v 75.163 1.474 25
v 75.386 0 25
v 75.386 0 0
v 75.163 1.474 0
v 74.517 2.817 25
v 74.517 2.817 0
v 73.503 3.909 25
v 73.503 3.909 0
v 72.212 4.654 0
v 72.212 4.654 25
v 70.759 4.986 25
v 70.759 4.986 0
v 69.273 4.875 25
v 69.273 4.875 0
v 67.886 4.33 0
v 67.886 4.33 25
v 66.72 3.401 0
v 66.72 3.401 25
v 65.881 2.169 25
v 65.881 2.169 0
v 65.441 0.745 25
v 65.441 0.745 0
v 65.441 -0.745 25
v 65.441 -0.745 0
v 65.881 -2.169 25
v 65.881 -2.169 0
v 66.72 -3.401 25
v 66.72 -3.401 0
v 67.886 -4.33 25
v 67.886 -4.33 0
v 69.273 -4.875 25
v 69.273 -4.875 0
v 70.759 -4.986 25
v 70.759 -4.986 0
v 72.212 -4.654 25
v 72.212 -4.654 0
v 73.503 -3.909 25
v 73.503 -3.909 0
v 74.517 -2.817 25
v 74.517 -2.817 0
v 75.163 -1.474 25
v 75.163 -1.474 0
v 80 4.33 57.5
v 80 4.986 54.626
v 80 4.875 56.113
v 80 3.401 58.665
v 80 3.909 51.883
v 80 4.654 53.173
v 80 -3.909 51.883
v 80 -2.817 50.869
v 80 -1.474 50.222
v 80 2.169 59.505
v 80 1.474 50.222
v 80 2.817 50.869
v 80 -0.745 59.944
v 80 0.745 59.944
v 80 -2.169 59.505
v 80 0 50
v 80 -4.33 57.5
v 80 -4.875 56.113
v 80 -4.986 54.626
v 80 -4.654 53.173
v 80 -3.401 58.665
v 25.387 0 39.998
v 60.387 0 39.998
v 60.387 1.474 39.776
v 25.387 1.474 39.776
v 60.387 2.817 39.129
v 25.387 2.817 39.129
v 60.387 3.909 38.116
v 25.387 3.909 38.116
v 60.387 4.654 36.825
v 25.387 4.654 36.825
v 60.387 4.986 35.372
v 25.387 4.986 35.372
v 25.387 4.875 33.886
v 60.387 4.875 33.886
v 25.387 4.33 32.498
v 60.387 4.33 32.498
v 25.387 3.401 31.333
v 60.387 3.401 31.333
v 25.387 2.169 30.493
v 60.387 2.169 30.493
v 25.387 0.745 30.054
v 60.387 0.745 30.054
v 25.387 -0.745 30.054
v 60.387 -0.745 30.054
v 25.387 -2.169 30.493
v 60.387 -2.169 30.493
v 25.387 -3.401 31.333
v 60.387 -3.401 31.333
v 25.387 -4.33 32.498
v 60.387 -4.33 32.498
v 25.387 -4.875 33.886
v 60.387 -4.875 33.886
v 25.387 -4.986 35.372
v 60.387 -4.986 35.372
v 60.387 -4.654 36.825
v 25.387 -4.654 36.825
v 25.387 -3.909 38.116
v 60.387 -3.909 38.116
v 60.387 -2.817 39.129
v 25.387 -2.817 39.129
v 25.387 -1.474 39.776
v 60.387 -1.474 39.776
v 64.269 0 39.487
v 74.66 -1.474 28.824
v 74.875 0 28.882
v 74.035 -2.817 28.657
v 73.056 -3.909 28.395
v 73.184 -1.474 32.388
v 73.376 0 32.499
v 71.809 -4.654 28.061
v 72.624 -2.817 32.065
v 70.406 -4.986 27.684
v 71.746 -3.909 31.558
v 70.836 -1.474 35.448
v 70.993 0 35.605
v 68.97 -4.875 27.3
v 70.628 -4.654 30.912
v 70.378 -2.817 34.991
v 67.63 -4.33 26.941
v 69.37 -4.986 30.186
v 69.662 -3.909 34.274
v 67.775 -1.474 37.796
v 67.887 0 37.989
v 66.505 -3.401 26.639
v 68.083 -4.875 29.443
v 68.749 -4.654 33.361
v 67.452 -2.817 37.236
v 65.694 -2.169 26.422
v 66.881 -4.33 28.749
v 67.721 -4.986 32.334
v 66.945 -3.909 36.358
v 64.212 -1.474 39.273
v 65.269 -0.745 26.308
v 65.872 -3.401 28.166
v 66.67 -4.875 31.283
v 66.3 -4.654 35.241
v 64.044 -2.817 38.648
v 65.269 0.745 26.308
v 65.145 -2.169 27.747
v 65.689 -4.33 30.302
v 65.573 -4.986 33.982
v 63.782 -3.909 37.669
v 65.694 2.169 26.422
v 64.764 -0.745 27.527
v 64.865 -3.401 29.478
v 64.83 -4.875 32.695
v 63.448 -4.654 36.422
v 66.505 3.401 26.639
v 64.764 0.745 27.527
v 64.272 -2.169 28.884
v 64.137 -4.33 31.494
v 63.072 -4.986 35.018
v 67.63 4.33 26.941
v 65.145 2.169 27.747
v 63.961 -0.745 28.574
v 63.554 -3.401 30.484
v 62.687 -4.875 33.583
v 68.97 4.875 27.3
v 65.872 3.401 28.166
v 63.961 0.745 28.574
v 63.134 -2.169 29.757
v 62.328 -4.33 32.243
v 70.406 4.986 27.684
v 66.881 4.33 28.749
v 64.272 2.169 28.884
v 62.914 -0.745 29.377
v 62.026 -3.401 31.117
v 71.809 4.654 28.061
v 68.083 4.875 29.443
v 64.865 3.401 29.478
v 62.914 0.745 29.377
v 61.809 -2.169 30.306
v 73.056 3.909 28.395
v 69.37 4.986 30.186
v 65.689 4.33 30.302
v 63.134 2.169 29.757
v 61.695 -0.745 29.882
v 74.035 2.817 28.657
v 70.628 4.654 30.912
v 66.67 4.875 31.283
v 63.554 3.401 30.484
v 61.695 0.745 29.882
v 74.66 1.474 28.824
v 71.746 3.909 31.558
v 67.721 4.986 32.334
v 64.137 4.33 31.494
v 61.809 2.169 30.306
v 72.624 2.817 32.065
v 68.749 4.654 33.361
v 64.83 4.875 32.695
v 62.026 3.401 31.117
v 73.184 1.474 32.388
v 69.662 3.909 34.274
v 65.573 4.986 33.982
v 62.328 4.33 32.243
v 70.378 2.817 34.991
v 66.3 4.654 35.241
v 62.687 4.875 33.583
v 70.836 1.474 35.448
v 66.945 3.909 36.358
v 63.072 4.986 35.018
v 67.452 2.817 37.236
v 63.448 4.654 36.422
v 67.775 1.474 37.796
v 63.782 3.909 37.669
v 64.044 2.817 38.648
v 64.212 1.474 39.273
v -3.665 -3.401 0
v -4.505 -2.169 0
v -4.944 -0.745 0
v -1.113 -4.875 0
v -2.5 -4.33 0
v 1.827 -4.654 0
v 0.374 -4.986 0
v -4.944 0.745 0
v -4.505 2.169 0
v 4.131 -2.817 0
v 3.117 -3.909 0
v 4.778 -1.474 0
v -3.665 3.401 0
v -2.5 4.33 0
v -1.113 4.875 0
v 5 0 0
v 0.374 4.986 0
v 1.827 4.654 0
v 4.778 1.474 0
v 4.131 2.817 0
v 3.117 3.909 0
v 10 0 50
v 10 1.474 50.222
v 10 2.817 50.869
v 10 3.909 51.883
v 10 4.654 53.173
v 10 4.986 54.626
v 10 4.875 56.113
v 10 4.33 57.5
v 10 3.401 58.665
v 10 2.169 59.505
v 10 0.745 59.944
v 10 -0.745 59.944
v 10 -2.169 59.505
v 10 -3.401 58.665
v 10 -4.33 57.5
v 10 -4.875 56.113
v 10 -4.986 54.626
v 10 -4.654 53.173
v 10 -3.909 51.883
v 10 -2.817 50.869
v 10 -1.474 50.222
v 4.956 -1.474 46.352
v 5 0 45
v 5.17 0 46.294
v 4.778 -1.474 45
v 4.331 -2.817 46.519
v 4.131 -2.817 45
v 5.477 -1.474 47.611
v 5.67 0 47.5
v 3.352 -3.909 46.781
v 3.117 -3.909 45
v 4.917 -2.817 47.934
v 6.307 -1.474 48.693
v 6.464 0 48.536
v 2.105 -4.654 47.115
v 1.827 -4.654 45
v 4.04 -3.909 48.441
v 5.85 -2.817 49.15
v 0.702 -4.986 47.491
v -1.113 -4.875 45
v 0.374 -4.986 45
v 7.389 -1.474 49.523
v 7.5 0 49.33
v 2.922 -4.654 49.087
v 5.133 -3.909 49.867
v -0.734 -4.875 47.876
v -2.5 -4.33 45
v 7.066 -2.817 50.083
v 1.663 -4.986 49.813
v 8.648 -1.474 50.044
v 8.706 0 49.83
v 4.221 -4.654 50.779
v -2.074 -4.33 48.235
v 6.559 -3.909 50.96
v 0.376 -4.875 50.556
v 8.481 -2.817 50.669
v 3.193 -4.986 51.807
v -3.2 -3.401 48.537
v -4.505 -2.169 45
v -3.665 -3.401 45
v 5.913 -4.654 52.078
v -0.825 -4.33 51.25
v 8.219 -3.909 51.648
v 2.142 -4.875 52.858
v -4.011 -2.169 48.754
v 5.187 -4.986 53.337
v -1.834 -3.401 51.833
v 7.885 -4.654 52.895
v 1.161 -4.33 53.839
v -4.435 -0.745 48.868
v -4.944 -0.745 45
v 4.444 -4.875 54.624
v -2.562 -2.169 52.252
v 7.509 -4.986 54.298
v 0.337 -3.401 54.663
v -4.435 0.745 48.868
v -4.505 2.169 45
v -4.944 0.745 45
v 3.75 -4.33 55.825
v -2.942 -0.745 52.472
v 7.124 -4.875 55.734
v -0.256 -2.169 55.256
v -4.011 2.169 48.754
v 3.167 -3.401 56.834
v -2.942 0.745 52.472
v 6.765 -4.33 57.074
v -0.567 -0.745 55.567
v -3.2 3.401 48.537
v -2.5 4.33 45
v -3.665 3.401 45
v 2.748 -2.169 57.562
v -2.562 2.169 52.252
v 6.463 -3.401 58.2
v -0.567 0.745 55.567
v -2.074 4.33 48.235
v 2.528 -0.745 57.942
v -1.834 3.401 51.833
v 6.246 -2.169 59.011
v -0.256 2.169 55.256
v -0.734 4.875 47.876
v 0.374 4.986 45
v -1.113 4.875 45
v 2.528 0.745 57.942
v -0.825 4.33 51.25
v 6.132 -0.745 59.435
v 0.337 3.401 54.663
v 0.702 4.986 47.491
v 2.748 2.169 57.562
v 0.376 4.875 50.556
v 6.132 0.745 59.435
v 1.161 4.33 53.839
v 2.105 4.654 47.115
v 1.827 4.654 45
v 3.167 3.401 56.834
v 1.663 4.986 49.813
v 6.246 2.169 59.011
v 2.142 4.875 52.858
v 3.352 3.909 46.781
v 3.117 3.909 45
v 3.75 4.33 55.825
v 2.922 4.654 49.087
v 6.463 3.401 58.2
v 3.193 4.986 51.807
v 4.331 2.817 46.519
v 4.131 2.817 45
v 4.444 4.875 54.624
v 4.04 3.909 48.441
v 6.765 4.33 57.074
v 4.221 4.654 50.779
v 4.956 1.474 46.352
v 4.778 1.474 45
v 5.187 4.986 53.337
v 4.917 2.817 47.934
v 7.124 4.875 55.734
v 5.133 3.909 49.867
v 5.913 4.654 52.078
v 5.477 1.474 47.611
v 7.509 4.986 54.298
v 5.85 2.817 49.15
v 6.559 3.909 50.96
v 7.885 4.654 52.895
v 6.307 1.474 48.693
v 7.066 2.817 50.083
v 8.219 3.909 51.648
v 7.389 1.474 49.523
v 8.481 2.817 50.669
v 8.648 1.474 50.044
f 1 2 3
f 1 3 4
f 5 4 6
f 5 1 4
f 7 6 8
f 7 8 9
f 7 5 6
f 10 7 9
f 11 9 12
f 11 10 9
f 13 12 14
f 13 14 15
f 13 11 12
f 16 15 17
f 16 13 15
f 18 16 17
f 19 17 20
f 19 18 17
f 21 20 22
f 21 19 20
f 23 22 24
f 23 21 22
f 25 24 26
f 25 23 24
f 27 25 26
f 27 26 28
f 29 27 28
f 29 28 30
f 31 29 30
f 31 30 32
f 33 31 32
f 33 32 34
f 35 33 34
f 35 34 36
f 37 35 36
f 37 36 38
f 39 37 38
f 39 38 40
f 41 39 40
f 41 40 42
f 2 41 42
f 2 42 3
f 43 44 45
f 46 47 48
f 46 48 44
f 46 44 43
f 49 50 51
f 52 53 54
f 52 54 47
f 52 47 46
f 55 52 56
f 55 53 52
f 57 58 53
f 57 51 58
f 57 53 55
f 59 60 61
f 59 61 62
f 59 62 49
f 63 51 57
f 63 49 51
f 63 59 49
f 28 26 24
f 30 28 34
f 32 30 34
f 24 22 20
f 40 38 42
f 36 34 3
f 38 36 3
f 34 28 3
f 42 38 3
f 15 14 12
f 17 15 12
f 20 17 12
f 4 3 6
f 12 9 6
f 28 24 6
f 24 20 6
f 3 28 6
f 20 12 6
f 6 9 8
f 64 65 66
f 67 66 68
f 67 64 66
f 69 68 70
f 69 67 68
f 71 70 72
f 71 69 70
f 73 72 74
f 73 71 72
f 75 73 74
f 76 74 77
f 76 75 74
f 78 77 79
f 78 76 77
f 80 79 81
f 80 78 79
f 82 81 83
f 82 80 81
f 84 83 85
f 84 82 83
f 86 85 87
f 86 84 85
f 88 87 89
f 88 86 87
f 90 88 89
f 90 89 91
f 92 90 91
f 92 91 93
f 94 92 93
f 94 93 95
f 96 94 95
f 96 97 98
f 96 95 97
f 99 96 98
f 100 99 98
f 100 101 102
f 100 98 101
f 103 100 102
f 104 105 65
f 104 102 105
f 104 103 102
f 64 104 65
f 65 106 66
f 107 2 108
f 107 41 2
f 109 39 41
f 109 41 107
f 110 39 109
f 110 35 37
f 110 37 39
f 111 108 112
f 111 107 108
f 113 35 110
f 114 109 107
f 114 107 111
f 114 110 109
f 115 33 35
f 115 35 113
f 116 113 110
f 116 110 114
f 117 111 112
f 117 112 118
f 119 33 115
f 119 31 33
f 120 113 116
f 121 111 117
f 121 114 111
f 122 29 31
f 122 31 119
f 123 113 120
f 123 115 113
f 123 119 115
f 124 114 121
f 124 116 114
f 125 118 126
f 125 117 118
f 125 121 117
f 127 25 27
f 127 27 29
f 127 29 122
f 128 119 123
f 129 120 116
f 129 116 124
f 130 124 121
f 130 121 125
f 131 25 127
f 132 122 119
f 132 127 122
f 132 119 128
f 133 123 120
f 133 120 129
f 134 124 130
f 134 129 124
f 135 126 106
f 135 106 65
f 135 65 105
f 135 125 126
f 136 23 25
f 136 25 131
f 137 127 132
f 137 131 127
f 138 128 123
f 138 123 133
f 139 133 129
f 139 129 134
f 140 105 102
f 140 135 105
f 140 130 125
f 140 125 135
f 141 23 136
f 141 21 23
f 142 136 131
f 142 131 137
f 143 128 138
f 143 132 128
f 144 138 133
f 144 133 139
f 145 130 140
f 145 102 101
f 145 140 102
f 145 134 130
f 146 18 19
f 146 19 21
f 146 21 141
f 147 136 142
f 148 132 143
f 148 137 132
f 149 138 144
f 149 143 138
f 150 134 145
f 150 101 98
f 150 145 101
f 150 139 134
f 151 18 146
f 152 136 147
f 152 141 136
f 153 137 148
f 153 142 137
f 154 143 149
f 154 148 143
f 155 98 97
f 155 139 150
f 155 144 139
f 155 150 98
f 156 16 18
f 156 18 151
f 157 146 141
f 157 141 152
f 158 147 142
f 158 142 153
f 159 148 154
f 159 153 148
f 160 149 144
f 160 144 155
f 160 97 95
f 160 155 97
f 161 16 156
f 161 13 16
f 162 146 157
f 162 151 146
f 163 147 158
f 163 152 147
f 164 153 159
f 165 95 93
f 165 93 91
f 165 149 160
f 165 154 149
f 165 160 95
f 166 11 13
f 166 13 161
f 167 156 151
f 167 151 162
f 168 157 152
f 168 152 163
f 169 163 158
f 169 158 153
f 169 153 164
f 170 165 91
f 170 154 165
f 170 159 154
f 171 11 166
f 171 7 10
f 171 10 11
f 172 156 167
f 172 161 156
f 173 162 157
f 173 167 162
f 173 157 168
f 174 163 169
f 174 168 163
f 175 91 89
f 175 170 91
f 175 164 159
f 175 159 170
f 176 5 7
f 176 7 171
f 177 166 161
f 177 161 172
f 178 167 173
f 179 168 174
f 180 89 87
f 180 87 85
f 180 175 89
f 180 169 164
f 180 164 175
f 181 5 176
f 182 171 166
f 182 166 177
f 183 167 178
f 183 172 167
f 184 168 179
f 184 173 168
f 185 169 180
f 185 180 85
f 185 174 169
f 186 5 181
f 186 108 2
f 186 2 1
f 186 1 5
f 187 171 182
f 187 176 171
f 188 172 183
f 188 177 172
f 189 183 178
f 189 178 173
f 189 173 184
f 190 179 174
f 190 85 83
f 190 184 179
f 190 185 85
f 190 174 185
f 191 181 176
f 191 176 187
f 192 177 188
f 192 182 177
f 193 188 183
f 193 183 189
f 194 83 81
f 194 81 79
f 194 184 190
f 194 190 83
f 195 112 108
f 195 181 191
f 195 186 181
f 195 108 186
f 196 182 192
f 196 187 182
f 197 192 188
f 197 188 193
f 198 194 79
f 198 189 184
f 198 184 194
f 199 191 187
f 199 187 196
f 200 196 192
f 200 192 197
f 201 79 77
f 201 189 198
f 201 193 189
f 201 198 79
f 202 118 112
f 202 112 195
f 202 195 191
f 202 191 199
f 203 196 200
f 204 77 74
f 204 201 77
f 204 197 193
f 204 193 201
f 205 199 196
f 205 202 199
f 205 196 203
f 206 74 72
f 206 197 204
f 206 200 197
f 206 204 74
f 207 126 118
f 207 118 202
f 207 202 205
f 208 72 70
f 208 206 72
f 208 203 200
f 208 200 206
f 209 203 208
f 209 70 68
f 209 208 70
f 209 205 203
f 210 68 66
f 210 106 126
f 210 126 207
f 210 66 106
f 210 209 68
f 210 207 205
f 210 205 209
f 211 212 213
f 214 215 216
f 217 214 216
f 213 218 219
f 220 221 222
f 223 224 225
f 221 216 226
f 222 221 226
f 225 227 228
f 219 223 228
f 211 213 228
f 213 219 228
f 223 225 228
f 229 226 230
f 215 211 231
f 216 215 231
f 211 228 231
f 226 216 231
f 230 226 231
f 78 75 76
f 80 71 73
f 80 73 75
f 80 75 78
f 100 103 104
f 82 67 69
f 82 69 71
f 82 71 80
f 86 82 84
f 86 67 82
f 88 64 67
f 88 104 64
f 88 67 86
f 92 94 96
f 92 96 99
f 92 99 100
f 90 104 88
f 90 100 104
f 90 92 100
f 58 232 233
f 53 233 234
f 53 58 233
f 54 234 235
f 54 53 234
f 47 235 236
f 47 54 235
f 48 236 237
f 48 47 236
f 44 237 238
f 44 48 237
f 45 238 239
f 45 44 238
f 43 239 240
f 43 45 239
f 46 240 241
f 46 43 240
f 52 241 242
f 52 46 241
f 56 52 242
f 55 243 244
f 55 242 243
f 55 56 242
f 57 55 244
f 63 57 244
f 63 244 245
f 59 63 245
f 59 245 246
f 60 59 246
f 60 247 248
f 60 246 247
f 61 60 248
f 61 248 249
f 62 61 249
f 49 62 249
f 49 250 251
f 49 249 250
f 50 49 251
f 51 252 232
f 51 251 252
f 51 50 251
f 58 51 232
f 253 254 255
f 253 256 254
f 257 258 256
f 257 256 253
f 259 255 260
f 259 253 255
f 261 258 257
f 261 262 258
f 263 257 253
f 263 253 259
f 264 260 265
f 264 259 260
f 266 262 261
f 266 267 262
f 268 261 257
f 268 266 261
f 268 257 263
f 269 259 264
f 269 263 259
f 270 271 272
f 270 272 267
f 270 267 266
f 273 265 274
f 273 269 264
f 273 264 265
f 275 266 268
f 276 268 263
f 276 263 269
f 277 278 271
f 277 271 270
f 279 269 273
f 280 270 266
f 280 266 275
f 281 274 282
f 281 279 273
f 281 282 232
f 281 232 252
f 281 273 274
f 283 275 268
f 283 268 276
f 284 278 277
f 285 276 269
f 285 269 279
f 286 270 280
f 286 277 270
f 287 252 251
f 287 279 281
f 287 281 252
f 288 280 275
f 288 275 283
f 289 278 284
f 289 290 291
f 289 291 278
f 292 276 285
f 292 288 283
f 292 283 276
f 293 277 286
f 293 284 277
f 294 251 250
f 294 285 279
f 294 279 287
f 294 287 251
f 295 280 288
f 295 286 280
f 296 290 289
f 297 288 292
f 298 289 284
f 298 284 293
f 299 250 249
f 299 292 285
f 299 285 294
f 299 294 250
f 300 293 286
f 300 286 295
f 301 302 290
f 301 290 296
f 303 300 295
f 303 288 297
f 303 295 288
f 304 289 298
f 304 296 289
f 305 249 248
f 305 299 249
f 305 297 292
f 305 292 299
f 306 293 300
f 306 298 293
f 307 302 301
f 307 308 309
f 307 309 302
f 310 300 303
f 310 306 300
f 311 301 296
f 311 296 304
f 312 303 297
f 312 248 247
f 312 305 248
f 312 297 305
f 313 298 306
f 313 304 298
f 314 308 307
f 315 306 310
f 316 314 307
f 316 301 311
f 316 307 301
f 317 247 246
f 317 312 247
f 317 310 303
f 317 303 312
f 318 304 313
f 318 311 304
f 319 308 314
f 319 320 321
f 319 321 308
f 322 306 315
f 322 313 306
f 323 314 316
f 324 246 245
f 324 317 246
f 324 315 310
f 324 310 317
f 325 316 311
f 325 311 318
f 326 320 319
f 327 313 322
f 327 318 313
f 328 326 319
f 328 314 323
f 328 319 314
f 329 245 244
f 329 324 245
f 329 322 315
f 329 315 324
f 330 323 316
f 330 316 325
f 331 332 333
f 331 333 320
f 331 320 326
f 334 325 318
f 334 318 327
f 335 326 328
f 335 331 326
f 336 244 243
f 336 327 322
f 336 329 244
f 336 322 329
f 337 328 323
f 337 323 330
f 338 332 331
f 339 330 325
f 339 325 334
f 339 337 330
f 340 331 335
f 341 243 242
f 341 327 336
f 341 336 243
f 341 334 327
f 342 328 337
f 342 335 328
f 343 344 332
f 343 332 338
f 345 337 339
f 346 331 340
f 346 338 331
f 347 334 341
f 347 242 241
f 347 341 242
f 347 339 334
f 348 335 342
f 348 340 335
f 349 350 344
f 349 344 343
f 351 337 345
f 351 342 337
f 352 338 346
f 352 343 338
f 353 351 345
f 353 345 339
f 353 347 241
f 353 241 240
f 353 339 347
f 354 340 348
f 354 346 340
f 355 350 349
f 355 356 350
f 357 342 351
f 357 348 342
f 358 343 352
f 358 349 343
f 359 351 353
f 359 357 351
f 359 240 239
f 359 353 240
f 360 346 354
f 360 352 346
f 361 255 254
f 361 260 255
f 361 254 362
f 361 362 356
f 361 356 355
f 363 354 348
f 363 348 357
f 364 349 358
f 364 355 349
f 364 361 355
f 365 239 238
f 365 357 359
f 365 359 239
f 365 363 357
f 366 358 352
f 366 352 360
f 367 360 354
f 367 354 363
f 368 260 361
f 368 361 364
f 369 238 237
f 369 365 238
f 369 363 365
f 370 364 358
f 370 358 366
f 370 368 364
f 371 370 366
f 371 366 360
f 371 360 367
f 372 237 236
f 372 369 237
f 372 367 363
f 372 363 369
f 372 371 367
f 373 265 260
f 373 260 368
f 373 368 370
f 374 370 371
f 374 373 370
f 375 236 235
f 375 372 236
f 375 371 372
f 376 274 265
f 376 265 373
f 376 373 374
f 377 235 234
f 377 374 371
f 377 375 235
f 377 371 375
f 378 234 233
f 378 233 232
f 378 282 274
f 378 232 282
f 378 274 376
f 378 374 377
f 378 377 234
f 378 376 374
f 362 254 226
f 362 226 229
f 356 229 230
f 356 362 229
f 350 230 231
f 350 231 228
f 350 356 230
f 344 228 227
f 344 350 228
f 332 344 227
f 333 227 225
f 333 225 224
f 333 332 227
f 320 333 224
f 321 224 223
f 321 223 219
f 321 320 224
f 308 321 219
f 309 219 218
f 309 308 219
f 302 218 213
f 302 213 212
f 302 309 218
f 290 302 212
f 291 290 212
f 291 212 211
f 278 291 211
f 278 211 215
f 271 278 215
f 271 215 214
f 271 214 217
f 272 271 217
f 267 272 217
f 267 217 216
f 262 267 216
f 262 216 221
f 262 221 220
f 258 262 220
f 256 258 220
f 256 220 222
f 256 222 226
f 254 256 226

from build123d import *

# Parameters (mm, degrees)
F1_R = 5
F4_R = 5


with BuildPart() as f2:
    # F2: sweep along a path in F0
    with BuildLine(Plane.XZ) as f2_path:
        Line((0, 0), (0, 45))
        ThreePointArc((0, 45), (2.9289321881, 52.0710678119), (10, 55))
        Line((10, 55), (80, 55))
    # F1 (on Top) → F2 (sweep)
    with BuildSketch(Plane.XY):
        Circle(F1_R)
    sweep(path=f2_path.line)


with BuildPart() as f5:
    # F5: sweep along a path in F3
    with BuildLine(Plane.XZ) as f5_path:
        Line((70.387423113, 0), (70.387423113, 25))
        ThreePointArc((70.387423113, 25), (67.4584909249, 32.0710678119), (60.387423113, 35))
        Line((60.387423113, 35), (25.387423113, 35))
    # F4 (on Top) → F5 (sweep)
    with BuildSketch(Plane.XY):
        with Locations((70.3855827451, 0)):
            Circle(F4_R)
    sweep(path=f5_path.line)


solid = Compound([f2.part, f5.part])
